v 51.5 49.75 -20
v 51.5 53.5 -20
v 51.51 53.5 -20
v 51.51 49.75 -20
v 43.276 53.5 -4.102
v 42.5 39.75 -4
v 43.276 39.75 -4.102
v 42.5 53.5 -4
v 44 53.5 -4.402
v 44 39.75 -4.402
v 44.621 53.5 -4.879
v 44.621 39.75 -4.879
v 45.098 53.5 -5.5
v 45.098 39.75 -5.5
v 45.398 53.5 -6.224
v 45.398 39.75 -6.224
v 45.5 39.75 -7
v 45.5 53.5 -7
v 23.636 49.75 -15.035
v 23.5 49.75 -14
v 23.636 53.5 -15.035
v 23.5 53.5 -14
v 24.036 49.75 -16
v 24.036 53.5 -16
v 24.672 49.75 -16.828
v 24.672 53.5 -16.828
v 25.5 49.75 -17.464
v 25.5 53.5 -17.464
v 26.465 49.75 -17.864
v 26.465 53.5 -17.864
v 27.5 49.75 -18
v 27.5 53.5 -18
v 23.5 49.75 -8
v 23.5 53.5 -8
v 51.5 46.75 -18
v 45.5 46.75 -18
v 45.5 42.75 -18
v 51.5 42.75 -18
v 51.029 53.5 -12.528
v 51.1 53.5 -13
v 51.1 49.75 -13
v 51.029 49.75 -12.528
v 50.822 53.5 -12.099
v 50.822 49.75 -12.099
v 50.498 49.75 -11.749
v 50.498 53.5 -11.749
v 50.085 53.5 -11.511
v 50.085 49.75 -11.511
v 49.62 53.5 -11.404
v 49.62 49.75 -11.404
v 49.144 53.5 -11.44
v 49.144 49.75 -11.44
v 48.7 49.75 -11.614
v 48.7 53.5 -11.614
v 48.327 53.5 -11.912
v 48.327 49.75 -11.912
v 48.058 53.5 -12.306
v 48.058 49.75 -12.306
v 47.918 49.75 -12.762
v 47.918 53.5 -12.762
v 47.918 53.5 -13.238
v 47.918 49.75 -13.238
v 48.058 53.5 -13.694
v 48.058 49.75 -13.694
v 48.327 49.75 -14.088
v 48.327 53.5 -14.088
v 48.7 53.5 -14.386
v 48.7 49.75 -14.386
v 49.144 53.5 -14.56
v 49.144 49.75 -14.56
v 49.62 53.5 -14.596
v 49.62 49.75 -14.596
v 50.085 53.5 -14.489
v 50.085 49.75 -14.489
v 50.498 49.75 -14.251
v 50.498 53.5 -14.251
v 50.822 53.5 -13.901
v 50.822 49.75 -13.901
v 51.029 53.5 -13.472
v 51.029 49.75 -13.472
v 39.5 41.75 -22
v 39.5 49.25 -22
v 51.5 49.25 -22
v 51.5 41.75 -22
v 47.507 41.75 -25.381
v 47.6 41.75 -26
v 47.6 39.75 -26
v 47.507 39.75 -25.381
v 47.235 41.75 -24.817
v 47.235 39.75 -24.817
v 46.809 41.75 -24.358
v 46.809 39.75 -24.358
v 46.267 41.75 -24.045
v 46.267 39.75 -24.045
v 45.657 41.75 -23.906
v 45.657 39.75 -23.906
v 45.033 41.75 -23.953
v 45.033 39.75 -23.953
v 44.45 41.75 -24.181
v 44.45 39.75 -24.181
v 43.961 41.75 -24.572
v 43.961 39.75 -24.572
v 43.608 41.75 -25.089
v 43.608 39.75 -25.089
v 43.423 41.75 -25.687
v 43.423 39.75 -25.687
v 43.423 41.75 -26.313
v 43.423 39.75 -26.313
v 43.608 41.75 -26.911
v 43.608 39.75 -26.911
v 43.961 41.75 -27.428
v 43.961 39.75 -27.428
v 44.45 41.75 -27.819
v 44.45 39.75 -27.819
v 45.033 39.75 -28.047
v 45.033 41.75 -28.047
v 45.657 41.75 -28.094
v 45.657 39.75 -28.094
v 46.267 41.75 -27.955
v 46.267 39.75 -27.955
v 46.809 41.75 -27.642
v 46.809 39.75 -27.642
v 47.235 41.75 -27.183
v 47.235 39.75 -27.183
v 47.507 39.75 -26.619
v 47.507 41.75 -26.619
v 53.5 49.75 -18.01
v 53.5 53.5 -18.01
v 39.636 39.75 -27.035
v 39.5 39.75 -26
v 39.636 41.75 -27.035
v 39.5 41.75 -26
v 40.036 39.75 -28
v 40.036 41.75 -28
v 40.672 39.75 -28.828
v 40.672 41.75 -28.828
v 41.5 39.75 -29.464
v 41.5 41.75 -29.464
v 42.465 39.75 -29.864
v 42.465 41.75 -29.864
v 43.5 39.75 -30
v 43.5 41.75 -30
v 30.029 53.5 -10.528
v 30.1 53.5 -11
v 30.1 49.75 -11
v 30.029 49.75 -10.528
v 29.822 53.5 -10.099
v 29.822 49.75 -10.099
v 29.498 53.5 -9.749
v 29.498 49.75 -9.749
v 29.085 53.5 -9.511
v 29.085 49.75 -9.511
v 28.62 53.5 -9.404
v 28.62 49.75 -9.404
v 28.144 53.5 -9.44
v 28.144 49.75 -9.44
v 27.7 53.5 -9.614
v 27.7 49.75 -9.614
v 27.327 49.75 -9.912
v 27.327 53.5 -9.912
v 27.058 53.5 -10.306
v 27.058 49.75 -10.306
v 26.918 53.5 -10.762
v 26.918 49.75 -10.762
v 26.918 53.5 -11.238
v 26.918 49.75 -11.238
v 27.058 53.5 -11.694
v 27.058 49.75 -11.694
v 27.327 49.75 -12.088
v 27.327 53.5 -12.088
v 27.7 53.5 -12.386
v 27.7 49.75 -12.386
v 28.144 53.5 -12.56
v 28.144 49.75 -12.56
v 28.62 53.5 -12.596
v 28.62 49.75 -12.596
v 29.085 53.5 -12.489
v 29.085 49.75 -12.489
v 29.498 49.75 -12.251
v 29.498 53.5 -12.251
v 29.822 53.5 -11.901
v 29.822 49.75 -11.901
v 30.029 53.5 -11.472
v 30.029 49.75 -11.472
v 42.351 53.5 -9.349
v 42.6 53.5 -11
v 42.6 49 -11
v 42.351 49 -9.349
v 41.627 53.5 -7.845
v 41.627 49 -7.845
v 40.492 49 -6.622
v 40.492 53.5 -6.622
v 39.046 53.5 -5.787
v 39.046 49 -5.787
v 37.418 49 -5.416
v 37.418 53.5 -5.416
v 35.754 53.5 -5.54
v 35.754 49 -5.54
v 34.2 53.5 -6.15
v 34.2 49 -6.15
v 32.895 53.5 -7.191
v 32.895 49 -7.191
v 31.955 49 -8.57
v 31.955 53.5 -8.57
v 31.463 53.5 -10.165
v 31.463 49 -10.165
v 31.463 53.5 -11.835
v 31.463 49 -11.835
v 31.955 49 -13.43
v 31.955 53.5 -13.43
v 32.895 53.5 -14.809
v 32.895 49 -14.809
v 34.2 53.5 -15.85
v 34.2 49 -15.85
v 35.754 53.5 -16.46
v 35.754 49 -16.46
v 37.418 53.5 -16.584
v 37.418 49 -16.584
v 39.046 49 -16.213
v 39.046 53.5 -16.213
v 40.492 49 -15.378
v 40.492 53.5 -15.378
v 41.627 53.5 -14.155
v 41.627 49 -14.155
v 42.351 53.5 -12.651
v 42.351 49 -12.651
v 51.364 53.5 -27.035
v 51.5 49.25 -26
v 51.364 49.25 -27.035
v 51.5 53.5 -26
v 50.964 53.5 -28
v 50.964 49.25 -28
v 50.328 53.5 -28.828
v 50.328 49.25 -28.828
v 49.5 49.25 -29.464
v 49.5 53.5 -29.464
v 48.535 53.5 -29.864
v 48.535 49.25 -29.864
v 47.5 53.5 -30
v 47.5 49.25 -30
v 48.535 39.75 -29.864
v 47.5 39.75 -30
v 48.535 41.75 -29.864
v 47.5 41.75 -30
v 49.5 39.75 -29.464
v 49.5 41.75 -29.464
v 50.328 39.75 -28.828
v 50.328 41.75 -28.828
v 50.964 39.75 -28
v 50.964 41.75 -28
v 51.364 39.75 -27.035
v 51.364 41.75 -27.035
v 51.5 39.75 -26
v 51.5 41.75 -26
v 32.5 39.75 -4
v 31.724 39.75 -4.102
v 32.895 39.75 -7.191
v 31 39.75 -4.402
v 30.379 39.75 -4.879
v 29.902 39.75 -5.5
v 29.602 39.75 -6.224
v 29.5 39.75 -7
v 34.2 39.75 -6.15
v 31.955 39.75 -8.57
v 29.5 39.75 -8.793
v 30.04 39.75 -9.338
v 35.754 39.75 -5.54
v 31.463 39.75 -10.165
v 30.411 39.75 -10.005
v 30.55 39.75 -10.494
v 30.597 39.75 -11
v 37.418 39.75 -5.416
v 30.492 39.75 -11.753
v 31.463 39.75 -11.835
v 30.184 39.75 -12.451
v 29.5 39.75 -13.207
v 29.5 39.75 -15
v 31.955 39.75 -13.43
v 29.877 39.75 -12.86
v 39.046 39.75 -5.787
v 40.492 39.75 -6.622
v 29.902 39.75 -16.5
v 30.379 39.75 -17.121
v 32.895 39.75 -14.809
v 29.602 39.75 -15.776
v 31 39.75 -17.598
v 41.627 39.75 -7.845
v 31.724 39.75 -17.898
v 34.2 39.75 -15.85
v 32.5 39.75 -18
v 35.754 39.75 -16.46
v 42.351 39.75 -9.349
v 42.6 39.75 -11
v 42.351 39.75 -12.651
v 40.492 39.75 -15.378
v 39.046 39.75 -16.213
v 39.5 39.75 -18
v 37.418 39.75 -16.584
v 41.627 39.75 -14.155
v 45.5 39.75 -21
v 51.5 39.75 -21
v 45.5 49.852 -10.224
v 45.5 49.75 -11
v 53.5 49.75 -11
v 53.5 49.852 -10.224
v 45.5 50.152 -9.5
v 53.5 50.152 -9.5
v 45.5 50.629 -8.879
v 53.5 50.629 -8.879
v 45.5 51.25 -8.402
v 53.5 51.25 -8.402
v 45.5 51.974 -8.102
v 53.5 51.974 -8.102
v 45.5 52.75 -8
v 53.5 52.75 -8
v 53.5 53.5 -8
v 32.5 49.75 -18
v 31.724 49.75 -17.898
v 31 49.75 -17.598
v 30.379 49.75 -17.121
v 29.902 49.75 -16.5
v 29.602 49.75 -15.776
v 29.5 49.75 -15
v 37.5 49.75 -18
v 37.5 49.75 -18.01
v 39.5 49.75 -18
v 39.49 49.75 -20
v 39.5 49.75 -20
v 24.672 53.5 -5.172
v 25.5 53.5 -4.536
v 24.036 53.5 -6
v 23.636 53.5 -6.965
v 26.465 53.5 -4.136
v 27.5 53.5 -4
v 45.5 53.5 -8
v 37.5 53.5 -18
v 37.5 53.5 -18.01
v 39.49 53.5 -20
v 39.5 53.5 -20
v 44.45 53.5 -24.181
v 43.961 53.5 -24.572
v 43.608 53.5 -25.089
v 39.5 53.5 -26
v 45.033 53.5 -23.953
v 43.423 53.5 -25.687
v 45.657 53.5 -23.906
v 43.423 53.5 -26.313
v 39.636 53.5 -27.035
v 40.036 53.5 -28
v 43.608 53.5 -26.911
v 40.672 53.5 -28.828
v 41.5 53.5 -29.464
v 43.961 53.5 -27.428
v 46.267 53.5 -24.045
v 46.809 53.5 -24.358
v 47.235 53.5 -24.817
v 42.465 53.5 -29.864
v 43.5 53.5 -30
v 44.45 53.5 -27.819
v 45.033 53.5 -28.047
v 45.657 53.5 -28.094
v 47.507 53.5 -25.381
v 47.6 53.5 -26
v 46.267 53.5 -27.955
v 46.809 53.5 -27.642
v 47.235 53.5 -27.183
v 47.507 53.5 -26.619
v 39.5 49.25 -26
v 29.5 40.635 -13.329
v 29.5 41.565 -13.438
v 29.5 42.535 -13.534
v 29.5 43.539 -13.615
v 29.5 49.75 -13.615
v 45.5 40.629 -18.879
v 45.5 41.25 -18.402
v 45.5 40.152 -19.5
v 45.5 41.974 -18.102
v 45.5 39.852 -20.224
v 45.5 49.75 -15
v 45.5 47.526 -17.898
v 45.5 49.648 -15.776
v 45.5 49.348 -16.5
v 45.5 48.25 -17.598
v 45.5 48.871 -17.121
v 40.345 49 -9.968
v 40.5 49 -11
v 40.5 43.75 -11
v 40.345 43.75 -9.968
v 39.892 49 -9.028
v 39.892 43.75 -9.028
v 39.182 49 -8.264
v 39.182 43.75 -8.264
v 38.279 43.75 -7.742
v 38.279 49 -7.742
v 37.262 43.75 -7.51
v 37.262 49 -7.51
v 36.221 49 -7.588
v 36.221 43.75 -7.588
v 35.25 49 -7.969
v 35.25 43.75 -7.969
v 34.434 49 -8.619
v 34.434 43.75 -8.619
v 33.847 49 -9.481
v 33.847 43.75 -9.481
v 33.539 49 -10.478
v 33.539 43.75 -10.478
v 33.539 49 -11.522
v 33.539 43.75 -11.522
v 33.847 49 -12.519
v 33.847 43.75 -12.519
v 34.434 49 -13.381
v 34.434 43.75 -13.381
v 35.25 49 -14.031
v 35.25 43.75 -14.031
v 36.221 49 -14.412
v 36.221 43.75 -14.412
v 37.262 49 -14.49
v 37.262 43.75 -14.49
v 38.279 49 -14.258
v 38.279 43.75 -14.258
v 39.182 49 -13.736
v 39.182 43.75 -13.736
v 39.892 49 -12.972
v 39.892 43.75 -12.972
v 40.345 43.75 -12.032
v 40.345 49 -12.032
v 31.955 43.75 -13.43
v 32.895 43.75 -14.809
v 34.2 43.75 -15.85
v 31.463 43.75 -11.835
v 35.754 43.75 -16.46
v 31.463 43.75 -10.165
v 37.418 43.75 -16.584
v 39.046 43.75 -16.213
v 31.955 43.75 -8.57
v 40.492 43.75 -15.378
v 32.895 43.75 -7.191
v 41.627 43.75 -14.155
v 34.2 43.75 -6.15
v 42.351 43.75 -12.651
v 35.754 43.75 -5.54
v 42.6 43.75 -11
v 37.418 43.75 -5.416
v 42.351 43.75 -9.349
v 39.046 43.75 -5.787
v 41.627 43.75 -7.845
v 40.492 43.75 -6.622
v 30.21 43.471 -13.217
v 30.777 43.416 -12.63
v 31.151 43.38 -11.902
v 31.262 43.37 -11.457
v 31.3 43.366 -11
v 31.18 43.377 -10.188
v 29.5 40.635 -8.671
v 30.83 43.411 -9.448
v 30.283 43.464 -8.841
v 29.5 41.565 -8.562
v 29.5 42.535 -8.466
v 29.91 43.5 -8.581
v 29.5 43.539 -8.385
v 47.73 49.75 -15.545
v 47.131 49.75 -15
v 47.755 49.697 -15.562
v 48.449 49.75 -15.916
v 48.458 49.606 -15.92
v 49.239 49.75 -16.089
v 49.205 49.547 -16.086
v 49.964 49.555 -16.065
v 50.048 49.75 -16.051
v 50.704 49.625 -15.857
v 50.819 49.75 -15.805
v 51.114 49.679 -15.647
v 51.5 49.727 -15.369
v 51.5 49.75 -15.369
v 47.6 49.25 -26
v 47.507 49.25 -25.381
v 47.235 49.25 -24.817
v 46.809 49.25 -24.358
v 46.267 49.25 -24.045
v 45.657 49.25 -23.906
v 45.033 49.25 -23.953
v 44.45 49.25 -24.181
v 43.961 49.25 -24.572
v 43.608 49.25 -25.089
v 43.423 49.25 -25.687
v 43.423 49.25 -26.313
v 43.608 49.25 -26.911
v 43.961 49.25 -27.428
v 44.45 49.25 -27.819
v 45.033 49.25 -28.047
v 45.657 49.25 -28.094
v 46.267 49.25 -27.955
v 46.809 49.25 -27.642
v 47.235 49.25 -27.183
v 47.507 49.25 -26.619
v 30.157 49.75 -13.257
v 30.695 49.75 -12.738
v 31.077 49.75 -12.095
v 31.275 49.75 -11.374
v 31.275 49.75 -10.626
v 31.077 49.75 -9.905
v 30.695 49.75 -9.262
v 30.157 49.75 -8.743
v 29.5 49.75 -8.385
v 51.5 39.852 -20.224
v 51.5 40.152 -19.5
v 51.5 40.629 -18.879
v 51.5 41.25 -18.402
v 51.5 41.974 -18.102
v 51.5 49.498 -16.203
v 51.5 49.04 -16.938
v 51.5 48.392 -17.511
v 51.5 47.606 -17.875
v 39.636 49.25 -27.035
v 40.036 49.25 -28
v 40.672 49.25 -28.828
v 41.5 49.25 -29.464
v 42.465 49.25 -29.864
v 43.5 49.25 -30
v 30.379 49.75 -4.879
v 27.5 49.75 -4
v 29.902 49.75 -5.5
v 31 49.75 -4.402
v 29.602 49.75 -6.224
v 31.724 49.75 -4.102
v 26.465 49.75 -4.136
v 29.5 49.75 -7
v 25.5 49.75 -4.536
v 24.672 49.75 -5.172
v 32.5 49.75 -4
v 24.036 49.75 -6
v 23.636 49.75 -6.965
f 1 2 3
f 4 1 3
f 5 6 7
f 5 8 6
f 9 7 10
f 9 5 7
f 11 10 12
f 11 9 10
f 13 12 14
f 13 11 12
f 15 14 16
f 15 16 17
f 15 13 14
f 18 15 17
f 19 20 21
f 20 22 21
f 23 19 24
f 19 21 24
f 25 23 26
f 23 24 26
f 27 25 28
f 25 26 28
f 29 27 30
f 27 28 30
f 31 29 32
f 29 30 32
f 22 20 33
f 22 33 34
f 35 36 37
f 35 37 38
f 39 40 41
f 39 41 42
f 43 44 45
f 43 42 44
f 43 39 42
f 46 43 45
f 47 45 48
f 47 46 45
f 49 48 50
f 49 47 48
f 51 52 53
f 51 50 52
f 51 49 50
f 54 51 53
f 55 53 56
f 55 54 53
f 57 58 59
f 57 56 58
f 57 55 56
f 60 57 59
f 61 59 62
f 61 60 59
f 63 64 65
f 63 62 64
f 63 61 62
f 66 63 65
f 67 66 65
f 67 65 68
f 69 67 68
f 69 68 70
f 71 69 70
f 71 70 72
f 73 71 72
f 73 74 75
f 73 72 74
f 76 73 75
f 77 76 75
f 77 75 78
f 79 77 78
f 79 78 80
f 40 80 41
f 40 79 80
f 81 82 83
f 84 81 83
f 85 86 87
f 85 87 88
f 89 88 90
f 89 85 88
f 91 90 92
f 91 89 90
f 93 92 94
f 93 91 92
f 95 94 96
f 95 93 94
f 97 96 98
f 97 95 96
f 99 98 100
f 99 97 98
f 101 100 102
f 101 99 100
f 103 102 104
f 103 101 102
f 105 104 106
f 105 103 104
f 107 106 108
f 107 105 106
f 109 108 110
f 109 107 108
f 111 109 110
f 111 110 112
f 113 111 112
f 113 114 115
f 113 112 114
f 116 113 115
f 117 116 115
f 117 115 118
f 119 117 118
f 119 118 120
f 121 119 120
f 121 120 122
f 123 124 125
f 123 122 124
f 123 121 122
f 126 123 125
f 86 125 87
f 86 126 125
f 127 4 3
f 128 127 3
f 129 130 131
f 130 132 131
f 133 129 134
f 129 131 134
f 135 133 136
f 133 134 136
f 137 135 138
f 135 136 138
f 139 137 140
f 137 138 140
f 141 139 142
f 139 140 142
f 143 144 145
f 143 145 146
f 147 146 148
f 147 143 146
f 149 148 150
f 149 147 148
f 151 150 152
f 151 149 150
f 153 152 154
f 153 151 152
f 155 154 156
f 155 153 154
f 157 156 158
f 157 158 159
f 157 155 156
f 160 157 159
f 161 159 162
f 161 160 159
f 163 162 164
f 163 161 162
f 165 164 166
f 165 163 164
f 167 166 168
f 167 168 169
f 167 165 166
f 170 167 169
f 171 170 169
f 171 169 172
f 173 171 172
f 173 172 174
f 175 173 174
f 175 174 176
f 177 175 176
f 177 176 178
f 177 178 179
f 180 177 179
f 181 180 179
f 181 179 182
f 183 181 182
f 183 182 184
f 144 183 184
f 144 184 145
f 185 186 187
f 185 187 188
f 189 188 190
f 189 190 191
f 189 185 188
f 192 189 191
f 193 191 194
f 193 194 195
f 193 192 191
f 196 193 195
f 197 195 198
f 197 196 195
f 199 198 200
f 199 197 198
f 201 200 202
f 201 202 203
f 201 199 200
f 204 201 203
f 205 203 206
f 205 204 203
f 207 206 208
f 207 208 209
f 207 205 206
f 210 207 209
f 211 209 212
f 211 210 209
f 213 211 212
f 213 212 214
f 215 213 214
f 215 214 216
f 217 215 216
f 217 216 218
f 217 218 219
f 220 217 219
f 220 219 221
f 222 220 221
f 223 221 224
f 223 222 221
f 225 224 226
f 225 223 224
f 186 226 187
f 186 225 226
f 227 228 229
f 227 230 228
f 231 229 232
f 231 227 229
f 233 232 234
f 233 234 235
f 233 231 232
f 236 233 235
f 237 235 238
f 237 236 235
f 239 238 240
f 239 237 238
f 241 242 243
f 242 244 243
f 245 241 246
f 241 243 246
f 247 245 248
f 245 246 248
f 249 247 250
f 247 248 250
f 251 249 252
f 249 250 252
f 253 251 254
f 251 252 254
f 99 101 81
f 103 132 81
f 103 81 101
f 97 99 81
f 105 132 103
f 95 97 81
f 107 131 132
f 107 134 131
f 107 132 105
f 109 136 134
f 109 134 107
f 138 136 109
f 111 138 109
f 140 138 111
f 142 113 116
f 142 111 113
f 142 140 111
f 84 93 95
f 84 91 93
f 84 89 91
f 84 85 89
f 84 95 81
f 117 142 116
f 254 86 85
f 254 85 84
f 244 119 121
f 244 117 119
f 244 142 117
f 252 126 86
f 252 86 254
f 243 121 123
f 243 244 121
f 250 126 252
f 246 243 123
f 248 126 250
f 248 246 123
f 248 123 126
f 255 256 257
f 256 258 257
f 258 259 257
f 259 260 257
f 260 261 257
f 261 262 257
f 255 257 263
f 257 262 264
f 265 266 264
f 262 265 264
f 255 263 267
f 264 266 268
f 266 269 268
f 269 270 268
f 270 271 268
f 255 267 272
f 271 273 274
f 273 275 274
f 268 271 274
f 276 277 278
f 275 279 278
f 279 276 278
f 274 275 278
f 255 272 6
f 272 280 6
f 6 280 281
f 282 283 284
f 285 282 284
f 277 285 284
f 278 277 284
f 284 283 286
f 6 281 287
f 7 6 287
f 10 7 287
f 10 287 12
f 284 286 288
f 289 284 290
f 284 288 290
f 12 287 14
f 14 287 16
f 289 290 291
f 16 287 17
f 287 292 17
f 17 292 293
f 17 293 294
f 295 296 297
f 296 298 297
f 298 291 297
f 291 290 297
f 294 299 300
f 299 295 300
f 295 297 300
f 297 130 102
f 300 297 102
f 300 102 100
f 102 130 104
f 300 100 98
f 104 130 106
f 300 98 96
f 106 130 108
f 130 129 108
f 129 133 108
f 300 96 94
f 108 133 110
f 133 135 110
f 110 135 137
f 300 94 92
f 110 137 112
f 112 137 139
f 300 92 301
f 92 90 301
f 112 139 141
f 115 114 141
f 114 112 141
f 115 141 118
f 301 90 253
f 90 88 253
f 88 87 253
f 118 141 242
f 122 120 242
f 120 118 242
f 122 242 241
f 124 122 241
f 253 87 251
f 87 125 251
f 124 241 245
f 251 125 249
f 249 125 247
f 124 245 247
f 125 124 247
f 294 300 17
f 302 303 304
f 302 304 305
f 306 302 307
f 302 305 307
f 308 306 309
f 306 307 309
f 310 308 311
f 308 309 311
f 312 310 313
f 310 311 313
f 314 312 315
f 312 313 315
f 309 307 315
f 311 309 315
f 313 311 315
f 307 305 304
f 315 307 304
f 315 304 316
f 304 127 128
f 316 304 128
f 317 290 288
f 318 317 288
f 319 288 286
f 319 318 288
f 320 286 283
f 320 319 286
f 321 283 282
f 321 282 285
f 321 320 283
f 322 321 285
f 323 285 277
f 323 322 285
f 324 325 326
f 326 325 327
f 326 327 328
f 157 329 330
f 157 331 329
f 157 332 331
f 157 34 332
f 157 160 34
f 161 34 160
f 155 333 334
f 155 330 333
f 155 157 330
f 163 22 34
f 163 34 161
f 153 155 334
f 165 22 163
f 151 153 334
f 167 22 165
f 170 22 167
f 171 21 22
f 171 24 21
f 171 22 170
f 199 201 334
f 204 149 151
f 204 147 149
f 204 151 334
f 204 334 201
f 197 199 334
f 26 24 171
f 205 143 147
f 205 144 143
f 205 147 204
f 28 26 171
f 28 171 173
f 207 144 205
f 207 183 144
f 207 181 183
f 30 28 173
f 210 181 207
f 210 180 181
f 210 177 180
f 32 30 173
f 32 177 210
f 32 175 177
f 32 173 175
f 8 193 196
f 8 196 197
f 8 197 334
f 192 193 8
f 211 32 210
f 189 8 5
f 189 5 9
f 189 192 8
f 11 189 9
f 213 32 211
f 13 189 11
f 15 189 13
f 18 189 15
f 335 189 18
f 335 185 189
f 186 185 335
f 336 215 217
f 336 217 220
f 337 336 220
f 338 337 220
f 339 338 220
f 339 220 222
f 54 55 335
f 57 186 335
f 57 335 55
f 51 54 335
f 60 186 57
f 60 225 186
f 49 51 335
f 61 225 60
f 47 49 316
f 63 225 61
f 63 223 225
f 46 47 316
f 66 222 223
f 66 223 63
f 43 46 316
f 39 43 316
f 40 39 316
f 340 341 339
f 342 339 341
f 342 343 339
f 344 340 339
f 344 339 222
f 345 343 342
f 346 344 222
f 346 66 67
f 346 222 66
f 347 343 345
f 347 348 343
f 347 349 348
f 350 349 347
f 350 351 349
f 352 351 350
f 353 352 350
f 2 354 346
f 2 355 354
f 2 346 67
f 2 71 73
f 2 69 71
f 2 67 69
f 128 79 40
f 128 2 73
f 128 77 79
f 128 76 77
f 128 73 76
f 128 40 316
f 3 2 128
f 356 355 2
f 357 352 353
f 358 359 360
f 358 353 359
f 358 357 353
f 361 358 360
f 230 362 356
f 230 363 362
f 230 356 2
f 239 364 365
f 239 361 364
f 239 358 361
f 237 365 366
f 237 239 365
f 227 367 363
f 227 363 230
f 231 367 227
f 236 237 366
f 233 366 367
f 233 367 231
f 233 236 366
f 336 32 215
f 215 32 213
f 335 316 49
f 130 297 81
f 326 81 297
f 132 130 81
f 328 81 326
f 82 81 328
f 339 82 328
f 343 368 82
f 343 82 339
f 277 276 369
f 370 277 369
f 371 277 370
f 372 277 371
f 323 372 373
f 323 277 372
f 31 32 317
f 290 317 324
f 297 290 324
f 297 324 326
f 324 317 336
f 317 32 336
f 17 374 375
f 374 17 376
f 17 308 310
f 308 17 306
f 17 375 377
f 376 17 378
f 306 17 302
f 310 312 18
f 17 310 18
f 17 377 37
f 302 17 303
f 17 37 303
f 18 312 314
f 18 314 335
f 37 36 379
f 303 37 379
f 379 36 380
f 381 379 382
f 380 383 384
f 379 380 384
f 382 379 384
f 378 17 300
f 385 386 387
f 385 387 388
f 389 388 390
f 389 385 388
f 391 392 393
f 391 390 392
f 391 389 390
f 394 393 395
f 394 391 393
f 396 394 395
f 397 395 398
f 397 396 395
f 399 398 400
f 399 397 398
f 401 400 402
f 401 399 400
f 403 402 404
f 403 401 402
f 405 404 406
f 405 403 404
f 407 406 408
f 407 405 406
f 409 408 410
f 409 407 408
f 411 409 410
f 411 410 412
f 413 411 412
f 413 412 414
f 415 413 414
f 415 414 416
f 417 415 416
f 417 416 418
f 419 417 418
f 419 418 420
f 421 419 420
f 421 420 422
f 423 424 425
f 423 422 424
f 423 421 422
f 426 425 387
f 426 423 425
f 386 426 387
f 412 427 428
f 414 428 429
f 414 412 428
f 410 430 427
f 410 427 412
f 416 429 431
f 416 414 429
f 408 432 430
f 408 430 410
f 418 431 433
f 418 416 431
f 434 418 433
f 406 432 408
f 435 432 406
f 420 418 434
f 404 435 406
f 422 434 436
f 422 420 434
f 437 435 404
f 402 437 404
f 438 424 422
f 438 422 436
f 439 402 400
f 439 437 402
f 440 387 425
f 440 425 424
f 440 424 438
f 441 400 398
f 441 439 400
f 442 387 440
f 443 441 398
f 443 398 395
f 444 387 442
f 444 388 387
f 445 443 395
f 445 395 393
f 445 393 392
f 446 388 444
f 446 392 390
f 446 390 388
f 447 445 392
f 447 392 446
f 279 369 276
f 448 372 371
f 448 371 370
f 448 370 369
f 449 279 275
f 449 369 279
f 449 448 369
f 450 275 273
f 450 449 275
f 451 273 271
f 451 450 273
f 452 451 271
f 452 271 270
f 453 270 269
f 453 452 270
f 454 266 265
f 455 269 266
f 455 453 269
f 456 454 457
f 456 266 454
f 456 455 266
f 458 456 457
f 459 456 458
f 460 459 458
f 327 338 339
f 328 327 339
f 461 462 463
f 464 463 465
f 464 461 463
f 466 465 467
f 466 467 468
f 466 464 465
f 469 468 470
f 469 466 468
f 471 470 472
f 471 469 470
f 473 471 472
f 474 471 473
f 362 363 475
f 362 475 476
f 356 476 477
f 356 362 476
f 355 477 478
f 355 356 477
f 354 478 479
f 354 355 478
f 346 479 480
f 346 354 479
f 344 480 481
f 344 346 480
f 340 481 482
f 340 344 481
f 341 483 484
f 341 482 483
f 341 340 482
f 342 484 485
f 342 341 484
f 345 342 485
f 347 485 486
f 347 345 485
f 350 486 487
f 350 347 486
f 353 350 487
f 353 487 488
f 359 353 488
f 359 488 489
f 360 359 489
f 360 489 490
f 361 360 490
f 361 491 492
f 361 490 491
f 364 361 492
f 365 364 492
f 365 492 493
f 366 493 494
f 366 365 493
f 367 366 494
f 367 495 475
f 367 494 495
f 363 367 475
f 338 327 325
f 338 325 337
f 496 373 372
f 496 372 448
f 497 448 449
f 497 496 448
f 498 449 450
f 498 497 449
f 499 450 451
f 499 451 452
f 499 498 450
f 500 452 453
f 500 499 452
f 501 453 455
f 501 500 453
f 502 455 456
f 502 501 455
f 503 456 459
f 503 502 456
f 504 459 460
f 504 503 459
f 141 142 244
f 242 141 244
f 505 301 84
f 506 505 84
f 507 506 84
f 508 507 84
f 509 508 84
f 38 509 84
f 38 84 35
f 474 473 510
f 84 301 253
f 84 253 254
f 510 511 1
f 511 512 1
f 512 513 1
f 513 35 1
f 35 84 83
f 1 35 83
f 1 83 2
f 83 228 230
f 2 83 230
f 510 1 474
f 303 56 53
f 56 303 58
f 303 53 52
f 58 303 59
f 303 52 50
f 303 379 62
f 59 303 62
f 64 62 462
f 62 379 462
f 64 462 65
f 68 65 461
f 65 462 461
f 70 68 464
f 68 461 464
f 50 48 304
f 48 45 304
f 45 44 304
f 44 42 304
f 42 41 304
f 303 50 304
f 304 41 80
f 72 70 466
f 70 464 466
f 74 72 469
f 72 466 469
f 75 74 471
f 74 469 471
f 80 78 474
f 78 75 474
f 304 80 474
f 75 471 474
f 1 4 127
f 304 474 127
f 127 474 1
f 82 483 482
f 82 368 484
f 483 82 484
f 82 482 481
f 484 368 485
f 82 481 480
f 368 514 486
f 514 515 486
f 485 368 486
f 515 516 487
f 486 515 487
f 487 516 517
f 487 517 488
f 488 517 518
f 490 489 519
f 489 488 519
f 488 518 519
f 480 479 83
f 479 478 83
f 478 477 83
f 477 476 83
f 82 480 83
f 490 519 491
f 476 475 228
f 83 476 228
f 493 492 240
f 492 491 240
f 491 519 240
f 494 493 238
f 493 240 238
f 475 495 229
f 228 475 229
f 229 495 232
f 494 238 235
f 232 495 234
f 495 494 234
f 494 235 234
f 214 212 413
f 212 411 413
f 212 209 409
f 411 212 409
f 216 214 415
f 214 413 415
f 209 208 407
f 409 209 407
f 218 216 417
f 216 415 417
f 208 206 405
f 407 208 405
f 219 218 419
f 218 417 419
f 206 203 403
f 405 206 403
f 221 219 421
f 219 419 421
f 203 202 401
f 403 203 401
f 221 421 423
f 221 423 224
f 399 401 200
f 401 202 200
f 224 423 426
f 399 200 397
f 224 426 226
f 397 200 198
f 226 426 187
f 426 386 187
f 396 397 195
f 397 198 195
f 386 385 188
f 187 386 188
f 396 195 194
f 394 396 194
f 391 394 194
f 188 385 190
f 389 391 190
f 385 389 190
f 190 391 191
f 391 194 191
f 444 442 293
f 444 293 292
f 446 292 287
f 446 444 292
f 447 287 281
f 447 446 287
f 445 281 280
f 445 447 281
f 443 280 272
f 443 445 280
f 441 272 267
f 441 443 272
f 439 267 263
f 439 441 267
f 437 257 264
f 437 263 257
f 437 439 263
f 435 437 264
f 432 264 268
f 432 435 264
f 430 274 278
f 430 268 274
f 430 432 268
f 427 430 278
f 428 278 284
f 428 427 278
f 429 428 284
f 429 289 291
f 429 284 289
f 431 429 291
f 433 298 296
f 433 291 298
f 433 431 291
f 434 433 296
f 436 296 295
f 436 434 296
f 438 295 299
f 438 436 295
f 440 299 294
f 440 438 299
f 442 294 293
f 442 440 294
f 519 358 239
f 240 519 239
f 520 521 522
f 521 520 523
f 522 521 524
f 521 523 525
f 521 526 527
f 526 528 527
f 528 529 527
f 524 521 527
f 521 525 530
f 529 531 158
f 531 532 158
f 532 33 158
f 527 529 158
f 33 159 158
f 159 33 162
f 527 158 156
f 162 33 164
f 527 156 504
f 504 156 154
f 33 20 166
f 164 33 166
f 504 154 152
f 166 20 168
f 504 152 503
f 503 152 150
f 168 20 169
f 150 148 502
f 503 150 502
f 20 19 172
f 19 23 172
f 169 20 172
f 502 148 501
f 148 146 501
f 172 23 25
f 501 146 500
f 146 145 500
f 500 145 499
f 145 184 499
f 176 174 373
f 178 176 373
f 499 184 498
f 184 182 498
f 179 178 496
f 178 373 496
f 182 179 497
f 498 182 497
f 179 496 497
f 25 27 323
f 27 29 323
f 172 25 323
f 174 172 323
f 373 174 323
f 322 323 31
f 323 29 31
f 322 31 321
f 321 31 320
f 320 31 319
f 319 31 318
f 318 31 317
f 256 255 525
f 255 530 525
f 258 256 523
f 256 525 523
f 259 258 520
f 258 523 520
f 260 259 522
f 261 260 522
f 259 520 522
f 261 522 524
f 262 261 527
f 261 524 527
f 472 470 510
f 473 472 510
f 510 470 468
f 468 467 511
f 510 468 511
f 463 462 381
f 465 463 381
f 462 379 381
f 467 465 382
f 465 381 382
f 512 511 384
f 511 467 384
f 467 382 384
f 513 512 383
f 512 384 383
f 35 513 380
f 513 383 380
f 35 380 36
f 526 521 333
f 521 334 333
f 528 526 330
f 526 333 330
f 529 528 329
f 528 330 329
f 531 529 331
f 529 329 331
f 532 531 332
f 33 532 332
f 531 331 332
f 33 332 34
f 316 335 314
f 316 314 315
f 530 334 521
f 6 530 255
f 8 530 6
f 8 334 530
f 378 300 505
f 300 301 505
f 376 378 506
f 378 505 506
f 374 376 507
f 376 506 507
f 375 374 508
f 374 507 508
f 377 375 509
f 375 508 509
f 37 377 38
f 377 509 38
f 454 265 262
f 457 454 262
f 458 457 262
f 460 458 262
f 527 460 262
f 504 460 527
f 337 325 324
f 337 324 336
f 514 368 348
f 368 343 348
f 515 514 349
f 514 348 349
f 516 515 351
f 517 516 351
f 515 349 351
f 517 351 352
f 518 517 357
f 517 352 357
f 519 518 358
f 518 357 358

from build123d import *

# Parameters (mm, degrees)
CYLINDER873_R               = 3.1
CYLINDER873_DEPTH           = 5
CYLINDER873_ROLL_ANGLE      = 90
CYLINDER872_R               = 5.6
CYLINDER872_DEPTH           = 4.5
CYLINDER872_ROLL_ANGLE      = 90
CYLINDER871_R               = 5.6
CYLINDER871_DEPTH           = 4
CYLINDER871_ROLL_ANGLE      = 90
CYLINDER870_R               = 3.5
CYLINDER870_DEPTH           = 14
CYLINDER870_ROLL_ANGLE      = 90
CYLINDER866_R               = 1.6
CYLINDER866_DEPTH           = 20
CYLINDER866_ROLL_ANGLE      = 90
CYLINDER869_R               = 2.1
CYLINDER869_DEPTH           = 20
CYLINDER869_ROLL_ANGLE      = 90
CYLINDER868_R               = 1.6
CYLINDER868_DEPTH           = 6.75
CYLINDER868_ROLL_ANGLE      = 90
CYLINDER867_R               = 2.8
CYLINDER867_DEPTH           = 10
CYLINDER867_ROLL_ANGLE      = 90
BOX542_W                    = 16
BOX542_H                    = 13
BOX542_DEPTH                = 14
BOX539_W                    = 12
BOX539_H                    = 7.5
BOX539_DEPTH                = 8
BOX538_W                    = 12
BOX538_H                    = 13.75
BOX538_DEPTH                = 12
BOX540_W                    = 30
BOX540_H                    = 3.75
BOX540_DEPTH                = 10
BOX541_W                    = 22
BOX541_H                    = 3.75
BOX541_DEPTH                = 14
FILLET352_R                 = 4
FILLET353_R                 = 3
FILLET354_R                 = 3
FILLET355_R                 = 4
FILLET356_R                 = 3
BOX543_W                    = 16
BOX543_H                    = 3.75
BOX543_DEPTH                = 2
CHAMFER102_SIZE             = 1.99
CYLINDER877_R               = 2.8
CYLINDER877_DEPTH           = 11
CYLINDER877_ROLL_ANGLE      = 89.99995
CYLINDER877_PITCH_ANGLE     = -5e-06
CYLINDER877_PLACEMENT_ANGLE = -10.999997
BOX545_W                    = 1.9
BOX545_H                    = 10
BOX545_DEPTH                = 8


with BuildPart() as cylinder1034:
    # Cylinder873 → Cylinder873 (new body)
    with BuildSketch(Plane.XY):
        Circle(CYLINDER873_R)
    extrude(amount=CYLINDER873_DEPTH)


with BuildPart() as cylinder1034_1:
    # Cylinder873 roll: moved
    add(cylinder1034.part.rotate(Axis((0, 0, 0), (1, 0, 0)), CYLINDER873_ROLL_ANGLE))


with BuildPart() as cylinder1034_2:
    # Cylinder873 placement: moved
    add(cylinder1034_1.part.moved(Location((49.5, 49.75, -13))))


with BuildPart() as cylinder1033:
    # Cylinder872 → Cylinder872 (new body)
    with BuildSketch(Plane.XY):
        Circle(CYLINDER872_R)
    extrude(amount=CYLINDER872_DEPTH)


with BuildPart() as cylinder1033_1:
    # Cylinder872 roll: moved
    add(cylinder1033.part.rotate(Axis((0, 0, 0), (1, 0, 0)), CYLINDER872_ROLL_ANGLE))


with BuildPart() as cylinder1033_2:
    # Cylinder872 placement: moved
    add(cylinder1033_1.part.moved(Location((38, 53.5, -11))))


with BuildPart() as cylinder1032:
    # Cylinder871 → Cylinder871 (new body)
    with BuildSketch(Plane.XY):
        Circle(CYLINDER871_R)
    extrude(amount=CYLINDER871_DEPTH)


with BuildPart() as cylinder1032_1:
    # Cylinder871 roll: moved
    add(cylinder1032.part.rotate(Axis((0, 0, 0), (1, 0, 0)), CYLINDER871_ROLL_ANGLE))


with BuildPart() as cylinder1032_2:
    # Cylinder871 placement: moved
    add(cylinder1032_1.part.moved(Location((38, 43.75, -11))))


with BuildPart() as fusion560:
    # Cylinder870 → Cylinder870 (new body)
    with BuildSketch(Plane.XY):
        Circle(CYLINDER870_R)
    extrude(amount=CYLINDER870_DEPTH)


with BuildPart() as fusion560_1:
    # Cylinder870 roll: moved
    add(fusion560.part.rotate(Axis((0, 0, 0), (1, 0, 0)), CYLINDER870_ROLL_ANGLE))


with BuildPart() as fusion560_2:
    # Cylinder870 placement: moved
    add(fusion560_1.part.moved(Location((38, 53.5, -11))))

    # Fusion560: union Cylinder1033, Cylinder1032
    add(cylinder1033_2.part)
    add(cylinder1032_2.part)


with BuildPart() as fusion560_3:
    # Fusion560 placement: moved
    add(fusion560_2.part.moved(Location((-1, 0, 0))))


with BuildPart() as cylinder1027:
    # Cylinder866 → Cylinder866 (new body)
    with BuildSketch(Plane.XY):
        Circle(CYLINDER866_R)
    extrude(amount=CYLINDER866_DEPTH)


with BuildPart() as cylinder1027_1:
    # Cylinder866 roll: moved
    add(cylinder1027.part.rotate(Axis((0, 0, 0), (1, 0, 0)), CYLINDER866_ROLL_ANGLE))


with BuildPart() as cylinder1027_2:
    # Cylinder866 placement: moved
    add(cylinder1027_1.part.moved(Location((49.5, 56.5, -13))))


with BuildPart() as cylinder1030:
    # Cylinder869 → Cylinder869 (new body)
    with BuildSketch(Plane.XY):
        Circle(CYLINDER869_R)
    extrude(amount=CYLINDER869_DEPTH)


with BuildPart() as cylinder1030_1:
    # Cylinder869 roll: moved
    add(cylinder1030.part.rotate(Axis((0, 0, 0), (1, 0, 0)), CYLINDER869_ROLL_ANGLE))


with BuildPart() as cylinder1030_2:
    # Cylinder869 placement: moved
    add(cylinder1030_1.part.moved(Location((45.5, 56.5, -26))))


with BuildPart() as fusion559:
    # Cylinder868 → Cylinder868 (new body)
    with BuildSketch(Plane.XY):
        Circle(CYLINDER868_R)
    extrude(amount=CYLINDER868_DEPTH)


with BuildPart() as fusion559_1:
    # Cylinder868 roll: moved
    add(fusion559.part.rotate(Axis((0, 0, 0), (1, 0, 0)), CYLINDER868_ROLL_ANGLE))


with BuildPart() as fusion559_2:
    # Cylinder868 placement: moved
    add(fusion559_1.part.moved(Location((28.5, 56.5, -11))))

    # Fusion559: union Cylinder1027, Cylinder1030
    add(cylinder1027_2.part)
    add(cylinder1030_2.part)


with BuildPart() as cylinder1028:
    # Cylinder867 → Cylinder867 (new body)
    with BuildSketch(Plane.XY):
        Circle(CYLINDER867_R)
    extrude(amount=CYLINDER867_DEPTH)


with BuildPart() as cylinder1028_1:
    # Cylinder867 roll: moved
    add(cylinder1028.part.rotate(Axis((0, 0, 0), (1, 0, 0)), CYLINDER867_ROLL_ANGLE))


with BuildPart() as cylinder1028_2:
    # Cylinder867 placement: moved
    add(cylinder1028_1.part.moved(Location((28.5, 49.75, -11))))


with BuildPart() as cube733:
    # Box542 → Box542 (new body)
    with BuildSketch(Plane(origin=(29.5, 39.75, -18), x_dir=(1, 0, 0), z_dir=(0, 0, 1))):
        with Locations((8, 6.5)):
            Rectangle(BOX542_W, BOX542_H)
    extrude(amount=BOX542_DEPTH)


with BuildPart() as cube730:
    # Box539 → Box539 (new body)
    with BuildSketch(Plane(origin=(389.5, 41.75, -32), x_dir=(1, 0, 0), z_dir=(0, 0, 1))):
        with Locations((6, 3.75)):
            Rectangle(BOX539_W, BOX539_H)
    extrude(amount=BOX539_DEPTH)


with BuildPart() as cut892:
    # Box538 → Box538 (new body)
    with BuildSketch(Plane(origin=(389.5, 39.75, -32), x_dir=(1, 0, 0), z_dir=(0, 0, 1))):
        with Locations((6, 6.875)):
            Rectangle(BOX538_W, BOX538_H)
    extrude(amount=BOX538_DEPTH)

    # Cut663: cut Cube730
    add(cube730.part, mode=Mode.SUBTRACT)


with BuildPart() as fusion556:
    # Box540 → Box540 (new body)
    with BuildSketch(Plane(origin=(373.5, 49.75, -20), x_dir=(1, 0, 0), z_dir=(0, 0, 1))):
        with Locations((15, 1.875)):
            Rectangle(BOX540_W, BOX540_H)
    extrude(amount=BOX540_DEPTH)

    # Fusion556: union Cut892
    add(cut892.part)


with BuildPart() as fusion556_1:
    # Fusion556 placement: moved
    add(fusion556.part.moved(Location((-350, 0, 2))))


with BuildPart() as fillet356:
    # Box541 → Box541 (new body)
    with BuildSketch(Plane(origin=(23.5, 49.75, -18), x_dir=(1, 0, 0), z_dir=(0, 0, 1))):
        with Locations((11, 1.875)):
            Rectangle(BOX541_W, BOX541_H)
    extrude(amount=BOX541_DEPTH)

    # Fusion557: union Fusion556
    add(fusion556_1.part)

    # Fusion558: union Cube733
    add(cube733.part)

    # Cut664: cut Cylinder1028
    add(cylinder1028_2.part, mode=Mode.SUBTRACT)

    # Cut665: cut Fusion559
    add(fusion559_2.part, mode=Mode.SUBTRACT)

    # Cut666: cut Fusion560
    add(fusion560_3.part, mode=Mode.SUBTRACT)

    # Fillet352
    fillet352_edges = [fillet356.edges().sort_by_distance(p)[0] for p in [
        (51.5, 40.75, -30),
        (51.5, 51.375, -30),
        (39.5, 40.75, -30),
        (39.5, 51.375, -30),
    ]]
    fillet(fillet352_edges, radius=FILLET352_R)

    # Fillet353
    fillet353_edges = [fillet356.edges().sort_by_distance(p)[0] for p in [
        (49.5, 49.75, -8),
        (48.5, 39.75, -18),
    ]]
    fillet(fillet353_edges, radius=FILLET353_R)

    # Fillet354
    fillet354_edges = [fillet356.edges().sort_by_distance(p)[0] for p in [
        (48.5, 49.75, -18),
    ]]
    fillet(fillet354_edges, radius=FILLET354_R)

    # Cut667: cut Cylinder1034
    add(cylinder1034_2.part, mode=Mode.SUBTRACT)

    # Fillet355
    fillet355_edges = [fillet356.edges().sort_by_distance(p)[0] for p in [
        (23.5, 51.625, -18),
        (23.5, 51.625, -4),
    ]]
    fillet(fillet355_edges, radius=FILLET355_R)

    # Fillet356
    fillet356_edges = [fillet356.edges().sort_by_distance(p)[0] for p in [
        (29.5, 44.75, -18),
        (45.5, 46.625, -4),
        (29.5, 44.75, -4),
    ]]
    fillet(fillet356_edges, radius=FILLET356_R)


with BuildPart() as chamfer102:
    # Box543 → Box543 (new body)
    with BuildSketch(Plane(origin=(37.5, 49.75, -20), x_dir=(1, 0, 0), z_dir=(0, 0, 1))):
        with Locations((8, 1.875)):
            Rectangle(BOX543_W, BOX543_H)
    extrude(amount=BOX543_DEPTH)

    # Chamfer102
    chamfer102_edges = [chamfer102.edges().sort_by_distance(p)[0] for p in [
        (37.5, 51.625, -20),
        (53.5, 51.625, -20),
    ]]
    chamfer(chamfer102_edges, length=CHAMFER102_SIZE)


with BuildPart() as cylinder1038:
    # Cylinder877 → Cylinder877 (new body)
    with BuildSketch(Plane.XY):
        Circle(CYLINDER877_R)
    extrude(amount=CYLINDER877_DEPTH)


with BuildPart() as cylinder1038_1:
    # Cylinder877 roll: moved
    add(cylinder1038.part.rotate(Axis((0, 0, 0), (1, 0, 0)), CYLINDER877_ROLL_ANGLE))


with BuildPart() as cylinder1038_2:
    # Cylinder877 pitch: moved
    add(cylinder1038_1.part.rotate(Axis((0, 0, 0), (0, 1, 0)), CYLINDER877_PITCH_ANGLE))


with BuildPart() as cylinder1038_3:
    # Cylinder877 placement: moved
    add(cylinder1038_2.part.moved(Location((29.8503, 50.5822, -11))).rotate(Axis((29.8503, 50.5822, -11), (0, 0, 1)), CYLINDER877_PLACEMENT_ANGLE))


with BuildPart() as leafspring_mount_front_left_int_servo:
    # Box545 → Box545 (new body)
    with BuildSketch(Plane(origin=(29.5, 39.75, -15), x_dir=(1, 0, 0), z_dir=(0, 0, 1))):
        with Locations((0.95, 5)):
            Rectangle(BOX545_W, BOX545_H)
    extrude(amount=BOX545_DEPTH)

    # Cut669: cut Cylinder1038
    add(cylinder1038_3.part, mode=Mode.SUBTRACT)

    # Fusion563: union Fillet356, Chamfer102
    add(fillet356.part)
    add(chamfer102.part)


solid = leafspring_mount_front_left_int_servo.part
